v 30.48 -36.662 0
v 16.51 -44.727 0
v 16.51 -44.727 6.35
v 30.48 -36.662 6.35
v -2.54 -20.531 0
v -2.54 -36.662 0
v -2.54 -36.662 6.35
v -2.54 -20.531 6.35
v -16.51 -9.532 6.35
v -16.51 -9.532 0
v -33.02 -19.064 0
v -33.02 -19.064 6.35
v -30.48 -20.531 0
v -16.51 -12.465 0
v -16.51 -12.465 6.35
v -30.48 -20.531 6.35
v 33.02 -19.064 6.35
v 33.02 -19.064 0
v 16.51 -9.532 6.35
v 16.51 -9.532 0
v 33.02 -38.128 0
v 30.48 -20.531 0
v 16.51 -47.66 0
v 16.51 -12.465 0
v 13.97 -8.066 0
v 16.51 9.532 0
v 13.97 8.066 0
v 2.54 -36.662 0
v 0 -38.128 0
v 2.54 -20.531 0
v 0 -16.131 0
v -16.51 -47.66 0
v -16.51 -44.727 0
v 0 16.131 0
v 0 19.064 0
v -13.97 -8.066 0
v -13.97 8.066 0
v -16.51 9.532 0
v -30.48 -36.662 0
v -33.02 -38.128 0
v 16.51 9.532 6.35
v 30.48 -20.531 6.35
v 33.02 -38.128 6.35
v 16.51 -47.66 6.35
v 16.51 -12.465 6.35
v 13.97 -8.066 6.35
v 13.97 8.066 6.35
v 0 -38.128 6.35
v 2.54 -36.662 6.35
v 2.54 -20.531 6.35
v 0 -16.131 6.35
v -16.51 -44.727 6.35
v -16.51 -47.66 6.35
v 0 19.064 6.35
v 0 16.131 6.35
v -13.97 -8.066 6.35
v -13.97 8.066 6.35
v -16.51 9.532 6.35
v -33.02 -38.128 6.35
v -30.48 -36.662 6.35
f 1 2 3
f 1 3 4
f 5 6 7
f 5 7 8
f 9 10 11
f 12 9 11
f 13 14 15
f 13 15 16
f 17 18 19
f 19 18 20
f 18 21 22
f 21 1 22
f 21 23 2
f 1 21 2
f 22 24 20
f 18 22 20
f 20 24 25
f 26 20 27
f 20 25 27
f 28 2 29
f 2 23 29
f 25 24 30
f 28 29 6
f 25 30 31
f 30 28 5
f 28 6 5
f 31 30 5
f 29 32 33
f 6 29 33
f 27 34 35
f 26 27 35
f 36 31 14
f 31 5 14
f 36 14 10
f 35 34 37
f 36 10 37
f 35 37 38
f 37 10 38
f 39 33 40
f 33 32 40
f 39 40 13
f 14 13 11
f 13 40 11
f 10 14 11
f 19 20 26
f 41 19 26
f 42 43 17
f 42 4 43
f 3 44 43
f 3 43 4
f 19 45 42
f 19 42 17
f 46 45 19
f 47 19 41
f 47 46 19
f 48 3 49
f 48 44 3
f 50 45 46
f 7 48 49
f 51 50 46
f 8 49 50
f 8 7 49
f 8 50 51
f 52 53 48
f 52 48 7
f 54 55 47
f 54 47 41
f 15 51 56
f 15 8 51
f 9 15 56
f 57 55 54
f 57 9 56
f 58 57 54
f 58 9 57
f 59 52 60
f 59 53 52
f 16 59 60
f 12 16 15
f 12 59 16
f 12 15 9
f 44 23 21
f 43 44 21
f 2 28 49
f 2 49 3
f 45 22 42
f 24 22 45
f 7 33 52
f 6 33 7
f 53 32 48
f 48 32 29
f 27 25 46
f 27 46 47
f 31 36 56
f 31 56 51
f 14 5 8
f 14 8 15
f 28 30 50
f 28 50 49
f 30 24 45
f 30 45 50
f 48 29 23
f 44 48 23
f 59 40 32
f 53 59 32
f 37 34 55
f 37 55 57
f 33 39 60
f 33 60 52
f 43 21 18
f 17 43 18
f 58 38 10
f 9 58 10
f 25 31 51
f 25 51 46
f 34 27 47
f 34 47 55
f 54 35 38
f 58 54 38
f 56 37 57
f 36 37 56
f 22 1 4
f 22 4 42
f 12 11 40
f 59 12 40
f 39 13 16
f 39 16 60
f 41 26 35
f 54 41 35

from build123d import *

# Parameters (mm, degrees)
F1_DEPTH = 6.35
F2_T     = -2.54
F3_COUNT = 3
F3_ANGLE = 240


with BuildPart() as f1:
    # F0 (on Top) → F1 (new body)
    with BuildSketch(Plane.XY):
        Polygon((16.51, 9.5320529443), (0, 19.0641058886), (-16.51, 9.5320529443), (-16.51, -9.5320529443), (0, -19.0641058886), (16.51, -9.5320529443), align=None)
    extrude(amount=F1_DEPTH)

    # F2
    f2_openings = [f1.faces().sort_by_distance(p)[0] for p in [
        (0, 0, 6.35),
        (0, 0, 0),
    ]]
    offset(amount=F2_T, openings=f2_openings)

    # F3: F1 ×3 about axis
    f3_axis = Axis((0, -19.0641058886, 3.175), (0, 0, -1))


with BuildPart() as f1_1:
    add(f1.part)
    for i in range(1, F3_COUNT):
        add(f1.part.rotate(f3_axis, i * F3_ANGLE / (F3_COUNT - 1)))


solid = f1_1.part
